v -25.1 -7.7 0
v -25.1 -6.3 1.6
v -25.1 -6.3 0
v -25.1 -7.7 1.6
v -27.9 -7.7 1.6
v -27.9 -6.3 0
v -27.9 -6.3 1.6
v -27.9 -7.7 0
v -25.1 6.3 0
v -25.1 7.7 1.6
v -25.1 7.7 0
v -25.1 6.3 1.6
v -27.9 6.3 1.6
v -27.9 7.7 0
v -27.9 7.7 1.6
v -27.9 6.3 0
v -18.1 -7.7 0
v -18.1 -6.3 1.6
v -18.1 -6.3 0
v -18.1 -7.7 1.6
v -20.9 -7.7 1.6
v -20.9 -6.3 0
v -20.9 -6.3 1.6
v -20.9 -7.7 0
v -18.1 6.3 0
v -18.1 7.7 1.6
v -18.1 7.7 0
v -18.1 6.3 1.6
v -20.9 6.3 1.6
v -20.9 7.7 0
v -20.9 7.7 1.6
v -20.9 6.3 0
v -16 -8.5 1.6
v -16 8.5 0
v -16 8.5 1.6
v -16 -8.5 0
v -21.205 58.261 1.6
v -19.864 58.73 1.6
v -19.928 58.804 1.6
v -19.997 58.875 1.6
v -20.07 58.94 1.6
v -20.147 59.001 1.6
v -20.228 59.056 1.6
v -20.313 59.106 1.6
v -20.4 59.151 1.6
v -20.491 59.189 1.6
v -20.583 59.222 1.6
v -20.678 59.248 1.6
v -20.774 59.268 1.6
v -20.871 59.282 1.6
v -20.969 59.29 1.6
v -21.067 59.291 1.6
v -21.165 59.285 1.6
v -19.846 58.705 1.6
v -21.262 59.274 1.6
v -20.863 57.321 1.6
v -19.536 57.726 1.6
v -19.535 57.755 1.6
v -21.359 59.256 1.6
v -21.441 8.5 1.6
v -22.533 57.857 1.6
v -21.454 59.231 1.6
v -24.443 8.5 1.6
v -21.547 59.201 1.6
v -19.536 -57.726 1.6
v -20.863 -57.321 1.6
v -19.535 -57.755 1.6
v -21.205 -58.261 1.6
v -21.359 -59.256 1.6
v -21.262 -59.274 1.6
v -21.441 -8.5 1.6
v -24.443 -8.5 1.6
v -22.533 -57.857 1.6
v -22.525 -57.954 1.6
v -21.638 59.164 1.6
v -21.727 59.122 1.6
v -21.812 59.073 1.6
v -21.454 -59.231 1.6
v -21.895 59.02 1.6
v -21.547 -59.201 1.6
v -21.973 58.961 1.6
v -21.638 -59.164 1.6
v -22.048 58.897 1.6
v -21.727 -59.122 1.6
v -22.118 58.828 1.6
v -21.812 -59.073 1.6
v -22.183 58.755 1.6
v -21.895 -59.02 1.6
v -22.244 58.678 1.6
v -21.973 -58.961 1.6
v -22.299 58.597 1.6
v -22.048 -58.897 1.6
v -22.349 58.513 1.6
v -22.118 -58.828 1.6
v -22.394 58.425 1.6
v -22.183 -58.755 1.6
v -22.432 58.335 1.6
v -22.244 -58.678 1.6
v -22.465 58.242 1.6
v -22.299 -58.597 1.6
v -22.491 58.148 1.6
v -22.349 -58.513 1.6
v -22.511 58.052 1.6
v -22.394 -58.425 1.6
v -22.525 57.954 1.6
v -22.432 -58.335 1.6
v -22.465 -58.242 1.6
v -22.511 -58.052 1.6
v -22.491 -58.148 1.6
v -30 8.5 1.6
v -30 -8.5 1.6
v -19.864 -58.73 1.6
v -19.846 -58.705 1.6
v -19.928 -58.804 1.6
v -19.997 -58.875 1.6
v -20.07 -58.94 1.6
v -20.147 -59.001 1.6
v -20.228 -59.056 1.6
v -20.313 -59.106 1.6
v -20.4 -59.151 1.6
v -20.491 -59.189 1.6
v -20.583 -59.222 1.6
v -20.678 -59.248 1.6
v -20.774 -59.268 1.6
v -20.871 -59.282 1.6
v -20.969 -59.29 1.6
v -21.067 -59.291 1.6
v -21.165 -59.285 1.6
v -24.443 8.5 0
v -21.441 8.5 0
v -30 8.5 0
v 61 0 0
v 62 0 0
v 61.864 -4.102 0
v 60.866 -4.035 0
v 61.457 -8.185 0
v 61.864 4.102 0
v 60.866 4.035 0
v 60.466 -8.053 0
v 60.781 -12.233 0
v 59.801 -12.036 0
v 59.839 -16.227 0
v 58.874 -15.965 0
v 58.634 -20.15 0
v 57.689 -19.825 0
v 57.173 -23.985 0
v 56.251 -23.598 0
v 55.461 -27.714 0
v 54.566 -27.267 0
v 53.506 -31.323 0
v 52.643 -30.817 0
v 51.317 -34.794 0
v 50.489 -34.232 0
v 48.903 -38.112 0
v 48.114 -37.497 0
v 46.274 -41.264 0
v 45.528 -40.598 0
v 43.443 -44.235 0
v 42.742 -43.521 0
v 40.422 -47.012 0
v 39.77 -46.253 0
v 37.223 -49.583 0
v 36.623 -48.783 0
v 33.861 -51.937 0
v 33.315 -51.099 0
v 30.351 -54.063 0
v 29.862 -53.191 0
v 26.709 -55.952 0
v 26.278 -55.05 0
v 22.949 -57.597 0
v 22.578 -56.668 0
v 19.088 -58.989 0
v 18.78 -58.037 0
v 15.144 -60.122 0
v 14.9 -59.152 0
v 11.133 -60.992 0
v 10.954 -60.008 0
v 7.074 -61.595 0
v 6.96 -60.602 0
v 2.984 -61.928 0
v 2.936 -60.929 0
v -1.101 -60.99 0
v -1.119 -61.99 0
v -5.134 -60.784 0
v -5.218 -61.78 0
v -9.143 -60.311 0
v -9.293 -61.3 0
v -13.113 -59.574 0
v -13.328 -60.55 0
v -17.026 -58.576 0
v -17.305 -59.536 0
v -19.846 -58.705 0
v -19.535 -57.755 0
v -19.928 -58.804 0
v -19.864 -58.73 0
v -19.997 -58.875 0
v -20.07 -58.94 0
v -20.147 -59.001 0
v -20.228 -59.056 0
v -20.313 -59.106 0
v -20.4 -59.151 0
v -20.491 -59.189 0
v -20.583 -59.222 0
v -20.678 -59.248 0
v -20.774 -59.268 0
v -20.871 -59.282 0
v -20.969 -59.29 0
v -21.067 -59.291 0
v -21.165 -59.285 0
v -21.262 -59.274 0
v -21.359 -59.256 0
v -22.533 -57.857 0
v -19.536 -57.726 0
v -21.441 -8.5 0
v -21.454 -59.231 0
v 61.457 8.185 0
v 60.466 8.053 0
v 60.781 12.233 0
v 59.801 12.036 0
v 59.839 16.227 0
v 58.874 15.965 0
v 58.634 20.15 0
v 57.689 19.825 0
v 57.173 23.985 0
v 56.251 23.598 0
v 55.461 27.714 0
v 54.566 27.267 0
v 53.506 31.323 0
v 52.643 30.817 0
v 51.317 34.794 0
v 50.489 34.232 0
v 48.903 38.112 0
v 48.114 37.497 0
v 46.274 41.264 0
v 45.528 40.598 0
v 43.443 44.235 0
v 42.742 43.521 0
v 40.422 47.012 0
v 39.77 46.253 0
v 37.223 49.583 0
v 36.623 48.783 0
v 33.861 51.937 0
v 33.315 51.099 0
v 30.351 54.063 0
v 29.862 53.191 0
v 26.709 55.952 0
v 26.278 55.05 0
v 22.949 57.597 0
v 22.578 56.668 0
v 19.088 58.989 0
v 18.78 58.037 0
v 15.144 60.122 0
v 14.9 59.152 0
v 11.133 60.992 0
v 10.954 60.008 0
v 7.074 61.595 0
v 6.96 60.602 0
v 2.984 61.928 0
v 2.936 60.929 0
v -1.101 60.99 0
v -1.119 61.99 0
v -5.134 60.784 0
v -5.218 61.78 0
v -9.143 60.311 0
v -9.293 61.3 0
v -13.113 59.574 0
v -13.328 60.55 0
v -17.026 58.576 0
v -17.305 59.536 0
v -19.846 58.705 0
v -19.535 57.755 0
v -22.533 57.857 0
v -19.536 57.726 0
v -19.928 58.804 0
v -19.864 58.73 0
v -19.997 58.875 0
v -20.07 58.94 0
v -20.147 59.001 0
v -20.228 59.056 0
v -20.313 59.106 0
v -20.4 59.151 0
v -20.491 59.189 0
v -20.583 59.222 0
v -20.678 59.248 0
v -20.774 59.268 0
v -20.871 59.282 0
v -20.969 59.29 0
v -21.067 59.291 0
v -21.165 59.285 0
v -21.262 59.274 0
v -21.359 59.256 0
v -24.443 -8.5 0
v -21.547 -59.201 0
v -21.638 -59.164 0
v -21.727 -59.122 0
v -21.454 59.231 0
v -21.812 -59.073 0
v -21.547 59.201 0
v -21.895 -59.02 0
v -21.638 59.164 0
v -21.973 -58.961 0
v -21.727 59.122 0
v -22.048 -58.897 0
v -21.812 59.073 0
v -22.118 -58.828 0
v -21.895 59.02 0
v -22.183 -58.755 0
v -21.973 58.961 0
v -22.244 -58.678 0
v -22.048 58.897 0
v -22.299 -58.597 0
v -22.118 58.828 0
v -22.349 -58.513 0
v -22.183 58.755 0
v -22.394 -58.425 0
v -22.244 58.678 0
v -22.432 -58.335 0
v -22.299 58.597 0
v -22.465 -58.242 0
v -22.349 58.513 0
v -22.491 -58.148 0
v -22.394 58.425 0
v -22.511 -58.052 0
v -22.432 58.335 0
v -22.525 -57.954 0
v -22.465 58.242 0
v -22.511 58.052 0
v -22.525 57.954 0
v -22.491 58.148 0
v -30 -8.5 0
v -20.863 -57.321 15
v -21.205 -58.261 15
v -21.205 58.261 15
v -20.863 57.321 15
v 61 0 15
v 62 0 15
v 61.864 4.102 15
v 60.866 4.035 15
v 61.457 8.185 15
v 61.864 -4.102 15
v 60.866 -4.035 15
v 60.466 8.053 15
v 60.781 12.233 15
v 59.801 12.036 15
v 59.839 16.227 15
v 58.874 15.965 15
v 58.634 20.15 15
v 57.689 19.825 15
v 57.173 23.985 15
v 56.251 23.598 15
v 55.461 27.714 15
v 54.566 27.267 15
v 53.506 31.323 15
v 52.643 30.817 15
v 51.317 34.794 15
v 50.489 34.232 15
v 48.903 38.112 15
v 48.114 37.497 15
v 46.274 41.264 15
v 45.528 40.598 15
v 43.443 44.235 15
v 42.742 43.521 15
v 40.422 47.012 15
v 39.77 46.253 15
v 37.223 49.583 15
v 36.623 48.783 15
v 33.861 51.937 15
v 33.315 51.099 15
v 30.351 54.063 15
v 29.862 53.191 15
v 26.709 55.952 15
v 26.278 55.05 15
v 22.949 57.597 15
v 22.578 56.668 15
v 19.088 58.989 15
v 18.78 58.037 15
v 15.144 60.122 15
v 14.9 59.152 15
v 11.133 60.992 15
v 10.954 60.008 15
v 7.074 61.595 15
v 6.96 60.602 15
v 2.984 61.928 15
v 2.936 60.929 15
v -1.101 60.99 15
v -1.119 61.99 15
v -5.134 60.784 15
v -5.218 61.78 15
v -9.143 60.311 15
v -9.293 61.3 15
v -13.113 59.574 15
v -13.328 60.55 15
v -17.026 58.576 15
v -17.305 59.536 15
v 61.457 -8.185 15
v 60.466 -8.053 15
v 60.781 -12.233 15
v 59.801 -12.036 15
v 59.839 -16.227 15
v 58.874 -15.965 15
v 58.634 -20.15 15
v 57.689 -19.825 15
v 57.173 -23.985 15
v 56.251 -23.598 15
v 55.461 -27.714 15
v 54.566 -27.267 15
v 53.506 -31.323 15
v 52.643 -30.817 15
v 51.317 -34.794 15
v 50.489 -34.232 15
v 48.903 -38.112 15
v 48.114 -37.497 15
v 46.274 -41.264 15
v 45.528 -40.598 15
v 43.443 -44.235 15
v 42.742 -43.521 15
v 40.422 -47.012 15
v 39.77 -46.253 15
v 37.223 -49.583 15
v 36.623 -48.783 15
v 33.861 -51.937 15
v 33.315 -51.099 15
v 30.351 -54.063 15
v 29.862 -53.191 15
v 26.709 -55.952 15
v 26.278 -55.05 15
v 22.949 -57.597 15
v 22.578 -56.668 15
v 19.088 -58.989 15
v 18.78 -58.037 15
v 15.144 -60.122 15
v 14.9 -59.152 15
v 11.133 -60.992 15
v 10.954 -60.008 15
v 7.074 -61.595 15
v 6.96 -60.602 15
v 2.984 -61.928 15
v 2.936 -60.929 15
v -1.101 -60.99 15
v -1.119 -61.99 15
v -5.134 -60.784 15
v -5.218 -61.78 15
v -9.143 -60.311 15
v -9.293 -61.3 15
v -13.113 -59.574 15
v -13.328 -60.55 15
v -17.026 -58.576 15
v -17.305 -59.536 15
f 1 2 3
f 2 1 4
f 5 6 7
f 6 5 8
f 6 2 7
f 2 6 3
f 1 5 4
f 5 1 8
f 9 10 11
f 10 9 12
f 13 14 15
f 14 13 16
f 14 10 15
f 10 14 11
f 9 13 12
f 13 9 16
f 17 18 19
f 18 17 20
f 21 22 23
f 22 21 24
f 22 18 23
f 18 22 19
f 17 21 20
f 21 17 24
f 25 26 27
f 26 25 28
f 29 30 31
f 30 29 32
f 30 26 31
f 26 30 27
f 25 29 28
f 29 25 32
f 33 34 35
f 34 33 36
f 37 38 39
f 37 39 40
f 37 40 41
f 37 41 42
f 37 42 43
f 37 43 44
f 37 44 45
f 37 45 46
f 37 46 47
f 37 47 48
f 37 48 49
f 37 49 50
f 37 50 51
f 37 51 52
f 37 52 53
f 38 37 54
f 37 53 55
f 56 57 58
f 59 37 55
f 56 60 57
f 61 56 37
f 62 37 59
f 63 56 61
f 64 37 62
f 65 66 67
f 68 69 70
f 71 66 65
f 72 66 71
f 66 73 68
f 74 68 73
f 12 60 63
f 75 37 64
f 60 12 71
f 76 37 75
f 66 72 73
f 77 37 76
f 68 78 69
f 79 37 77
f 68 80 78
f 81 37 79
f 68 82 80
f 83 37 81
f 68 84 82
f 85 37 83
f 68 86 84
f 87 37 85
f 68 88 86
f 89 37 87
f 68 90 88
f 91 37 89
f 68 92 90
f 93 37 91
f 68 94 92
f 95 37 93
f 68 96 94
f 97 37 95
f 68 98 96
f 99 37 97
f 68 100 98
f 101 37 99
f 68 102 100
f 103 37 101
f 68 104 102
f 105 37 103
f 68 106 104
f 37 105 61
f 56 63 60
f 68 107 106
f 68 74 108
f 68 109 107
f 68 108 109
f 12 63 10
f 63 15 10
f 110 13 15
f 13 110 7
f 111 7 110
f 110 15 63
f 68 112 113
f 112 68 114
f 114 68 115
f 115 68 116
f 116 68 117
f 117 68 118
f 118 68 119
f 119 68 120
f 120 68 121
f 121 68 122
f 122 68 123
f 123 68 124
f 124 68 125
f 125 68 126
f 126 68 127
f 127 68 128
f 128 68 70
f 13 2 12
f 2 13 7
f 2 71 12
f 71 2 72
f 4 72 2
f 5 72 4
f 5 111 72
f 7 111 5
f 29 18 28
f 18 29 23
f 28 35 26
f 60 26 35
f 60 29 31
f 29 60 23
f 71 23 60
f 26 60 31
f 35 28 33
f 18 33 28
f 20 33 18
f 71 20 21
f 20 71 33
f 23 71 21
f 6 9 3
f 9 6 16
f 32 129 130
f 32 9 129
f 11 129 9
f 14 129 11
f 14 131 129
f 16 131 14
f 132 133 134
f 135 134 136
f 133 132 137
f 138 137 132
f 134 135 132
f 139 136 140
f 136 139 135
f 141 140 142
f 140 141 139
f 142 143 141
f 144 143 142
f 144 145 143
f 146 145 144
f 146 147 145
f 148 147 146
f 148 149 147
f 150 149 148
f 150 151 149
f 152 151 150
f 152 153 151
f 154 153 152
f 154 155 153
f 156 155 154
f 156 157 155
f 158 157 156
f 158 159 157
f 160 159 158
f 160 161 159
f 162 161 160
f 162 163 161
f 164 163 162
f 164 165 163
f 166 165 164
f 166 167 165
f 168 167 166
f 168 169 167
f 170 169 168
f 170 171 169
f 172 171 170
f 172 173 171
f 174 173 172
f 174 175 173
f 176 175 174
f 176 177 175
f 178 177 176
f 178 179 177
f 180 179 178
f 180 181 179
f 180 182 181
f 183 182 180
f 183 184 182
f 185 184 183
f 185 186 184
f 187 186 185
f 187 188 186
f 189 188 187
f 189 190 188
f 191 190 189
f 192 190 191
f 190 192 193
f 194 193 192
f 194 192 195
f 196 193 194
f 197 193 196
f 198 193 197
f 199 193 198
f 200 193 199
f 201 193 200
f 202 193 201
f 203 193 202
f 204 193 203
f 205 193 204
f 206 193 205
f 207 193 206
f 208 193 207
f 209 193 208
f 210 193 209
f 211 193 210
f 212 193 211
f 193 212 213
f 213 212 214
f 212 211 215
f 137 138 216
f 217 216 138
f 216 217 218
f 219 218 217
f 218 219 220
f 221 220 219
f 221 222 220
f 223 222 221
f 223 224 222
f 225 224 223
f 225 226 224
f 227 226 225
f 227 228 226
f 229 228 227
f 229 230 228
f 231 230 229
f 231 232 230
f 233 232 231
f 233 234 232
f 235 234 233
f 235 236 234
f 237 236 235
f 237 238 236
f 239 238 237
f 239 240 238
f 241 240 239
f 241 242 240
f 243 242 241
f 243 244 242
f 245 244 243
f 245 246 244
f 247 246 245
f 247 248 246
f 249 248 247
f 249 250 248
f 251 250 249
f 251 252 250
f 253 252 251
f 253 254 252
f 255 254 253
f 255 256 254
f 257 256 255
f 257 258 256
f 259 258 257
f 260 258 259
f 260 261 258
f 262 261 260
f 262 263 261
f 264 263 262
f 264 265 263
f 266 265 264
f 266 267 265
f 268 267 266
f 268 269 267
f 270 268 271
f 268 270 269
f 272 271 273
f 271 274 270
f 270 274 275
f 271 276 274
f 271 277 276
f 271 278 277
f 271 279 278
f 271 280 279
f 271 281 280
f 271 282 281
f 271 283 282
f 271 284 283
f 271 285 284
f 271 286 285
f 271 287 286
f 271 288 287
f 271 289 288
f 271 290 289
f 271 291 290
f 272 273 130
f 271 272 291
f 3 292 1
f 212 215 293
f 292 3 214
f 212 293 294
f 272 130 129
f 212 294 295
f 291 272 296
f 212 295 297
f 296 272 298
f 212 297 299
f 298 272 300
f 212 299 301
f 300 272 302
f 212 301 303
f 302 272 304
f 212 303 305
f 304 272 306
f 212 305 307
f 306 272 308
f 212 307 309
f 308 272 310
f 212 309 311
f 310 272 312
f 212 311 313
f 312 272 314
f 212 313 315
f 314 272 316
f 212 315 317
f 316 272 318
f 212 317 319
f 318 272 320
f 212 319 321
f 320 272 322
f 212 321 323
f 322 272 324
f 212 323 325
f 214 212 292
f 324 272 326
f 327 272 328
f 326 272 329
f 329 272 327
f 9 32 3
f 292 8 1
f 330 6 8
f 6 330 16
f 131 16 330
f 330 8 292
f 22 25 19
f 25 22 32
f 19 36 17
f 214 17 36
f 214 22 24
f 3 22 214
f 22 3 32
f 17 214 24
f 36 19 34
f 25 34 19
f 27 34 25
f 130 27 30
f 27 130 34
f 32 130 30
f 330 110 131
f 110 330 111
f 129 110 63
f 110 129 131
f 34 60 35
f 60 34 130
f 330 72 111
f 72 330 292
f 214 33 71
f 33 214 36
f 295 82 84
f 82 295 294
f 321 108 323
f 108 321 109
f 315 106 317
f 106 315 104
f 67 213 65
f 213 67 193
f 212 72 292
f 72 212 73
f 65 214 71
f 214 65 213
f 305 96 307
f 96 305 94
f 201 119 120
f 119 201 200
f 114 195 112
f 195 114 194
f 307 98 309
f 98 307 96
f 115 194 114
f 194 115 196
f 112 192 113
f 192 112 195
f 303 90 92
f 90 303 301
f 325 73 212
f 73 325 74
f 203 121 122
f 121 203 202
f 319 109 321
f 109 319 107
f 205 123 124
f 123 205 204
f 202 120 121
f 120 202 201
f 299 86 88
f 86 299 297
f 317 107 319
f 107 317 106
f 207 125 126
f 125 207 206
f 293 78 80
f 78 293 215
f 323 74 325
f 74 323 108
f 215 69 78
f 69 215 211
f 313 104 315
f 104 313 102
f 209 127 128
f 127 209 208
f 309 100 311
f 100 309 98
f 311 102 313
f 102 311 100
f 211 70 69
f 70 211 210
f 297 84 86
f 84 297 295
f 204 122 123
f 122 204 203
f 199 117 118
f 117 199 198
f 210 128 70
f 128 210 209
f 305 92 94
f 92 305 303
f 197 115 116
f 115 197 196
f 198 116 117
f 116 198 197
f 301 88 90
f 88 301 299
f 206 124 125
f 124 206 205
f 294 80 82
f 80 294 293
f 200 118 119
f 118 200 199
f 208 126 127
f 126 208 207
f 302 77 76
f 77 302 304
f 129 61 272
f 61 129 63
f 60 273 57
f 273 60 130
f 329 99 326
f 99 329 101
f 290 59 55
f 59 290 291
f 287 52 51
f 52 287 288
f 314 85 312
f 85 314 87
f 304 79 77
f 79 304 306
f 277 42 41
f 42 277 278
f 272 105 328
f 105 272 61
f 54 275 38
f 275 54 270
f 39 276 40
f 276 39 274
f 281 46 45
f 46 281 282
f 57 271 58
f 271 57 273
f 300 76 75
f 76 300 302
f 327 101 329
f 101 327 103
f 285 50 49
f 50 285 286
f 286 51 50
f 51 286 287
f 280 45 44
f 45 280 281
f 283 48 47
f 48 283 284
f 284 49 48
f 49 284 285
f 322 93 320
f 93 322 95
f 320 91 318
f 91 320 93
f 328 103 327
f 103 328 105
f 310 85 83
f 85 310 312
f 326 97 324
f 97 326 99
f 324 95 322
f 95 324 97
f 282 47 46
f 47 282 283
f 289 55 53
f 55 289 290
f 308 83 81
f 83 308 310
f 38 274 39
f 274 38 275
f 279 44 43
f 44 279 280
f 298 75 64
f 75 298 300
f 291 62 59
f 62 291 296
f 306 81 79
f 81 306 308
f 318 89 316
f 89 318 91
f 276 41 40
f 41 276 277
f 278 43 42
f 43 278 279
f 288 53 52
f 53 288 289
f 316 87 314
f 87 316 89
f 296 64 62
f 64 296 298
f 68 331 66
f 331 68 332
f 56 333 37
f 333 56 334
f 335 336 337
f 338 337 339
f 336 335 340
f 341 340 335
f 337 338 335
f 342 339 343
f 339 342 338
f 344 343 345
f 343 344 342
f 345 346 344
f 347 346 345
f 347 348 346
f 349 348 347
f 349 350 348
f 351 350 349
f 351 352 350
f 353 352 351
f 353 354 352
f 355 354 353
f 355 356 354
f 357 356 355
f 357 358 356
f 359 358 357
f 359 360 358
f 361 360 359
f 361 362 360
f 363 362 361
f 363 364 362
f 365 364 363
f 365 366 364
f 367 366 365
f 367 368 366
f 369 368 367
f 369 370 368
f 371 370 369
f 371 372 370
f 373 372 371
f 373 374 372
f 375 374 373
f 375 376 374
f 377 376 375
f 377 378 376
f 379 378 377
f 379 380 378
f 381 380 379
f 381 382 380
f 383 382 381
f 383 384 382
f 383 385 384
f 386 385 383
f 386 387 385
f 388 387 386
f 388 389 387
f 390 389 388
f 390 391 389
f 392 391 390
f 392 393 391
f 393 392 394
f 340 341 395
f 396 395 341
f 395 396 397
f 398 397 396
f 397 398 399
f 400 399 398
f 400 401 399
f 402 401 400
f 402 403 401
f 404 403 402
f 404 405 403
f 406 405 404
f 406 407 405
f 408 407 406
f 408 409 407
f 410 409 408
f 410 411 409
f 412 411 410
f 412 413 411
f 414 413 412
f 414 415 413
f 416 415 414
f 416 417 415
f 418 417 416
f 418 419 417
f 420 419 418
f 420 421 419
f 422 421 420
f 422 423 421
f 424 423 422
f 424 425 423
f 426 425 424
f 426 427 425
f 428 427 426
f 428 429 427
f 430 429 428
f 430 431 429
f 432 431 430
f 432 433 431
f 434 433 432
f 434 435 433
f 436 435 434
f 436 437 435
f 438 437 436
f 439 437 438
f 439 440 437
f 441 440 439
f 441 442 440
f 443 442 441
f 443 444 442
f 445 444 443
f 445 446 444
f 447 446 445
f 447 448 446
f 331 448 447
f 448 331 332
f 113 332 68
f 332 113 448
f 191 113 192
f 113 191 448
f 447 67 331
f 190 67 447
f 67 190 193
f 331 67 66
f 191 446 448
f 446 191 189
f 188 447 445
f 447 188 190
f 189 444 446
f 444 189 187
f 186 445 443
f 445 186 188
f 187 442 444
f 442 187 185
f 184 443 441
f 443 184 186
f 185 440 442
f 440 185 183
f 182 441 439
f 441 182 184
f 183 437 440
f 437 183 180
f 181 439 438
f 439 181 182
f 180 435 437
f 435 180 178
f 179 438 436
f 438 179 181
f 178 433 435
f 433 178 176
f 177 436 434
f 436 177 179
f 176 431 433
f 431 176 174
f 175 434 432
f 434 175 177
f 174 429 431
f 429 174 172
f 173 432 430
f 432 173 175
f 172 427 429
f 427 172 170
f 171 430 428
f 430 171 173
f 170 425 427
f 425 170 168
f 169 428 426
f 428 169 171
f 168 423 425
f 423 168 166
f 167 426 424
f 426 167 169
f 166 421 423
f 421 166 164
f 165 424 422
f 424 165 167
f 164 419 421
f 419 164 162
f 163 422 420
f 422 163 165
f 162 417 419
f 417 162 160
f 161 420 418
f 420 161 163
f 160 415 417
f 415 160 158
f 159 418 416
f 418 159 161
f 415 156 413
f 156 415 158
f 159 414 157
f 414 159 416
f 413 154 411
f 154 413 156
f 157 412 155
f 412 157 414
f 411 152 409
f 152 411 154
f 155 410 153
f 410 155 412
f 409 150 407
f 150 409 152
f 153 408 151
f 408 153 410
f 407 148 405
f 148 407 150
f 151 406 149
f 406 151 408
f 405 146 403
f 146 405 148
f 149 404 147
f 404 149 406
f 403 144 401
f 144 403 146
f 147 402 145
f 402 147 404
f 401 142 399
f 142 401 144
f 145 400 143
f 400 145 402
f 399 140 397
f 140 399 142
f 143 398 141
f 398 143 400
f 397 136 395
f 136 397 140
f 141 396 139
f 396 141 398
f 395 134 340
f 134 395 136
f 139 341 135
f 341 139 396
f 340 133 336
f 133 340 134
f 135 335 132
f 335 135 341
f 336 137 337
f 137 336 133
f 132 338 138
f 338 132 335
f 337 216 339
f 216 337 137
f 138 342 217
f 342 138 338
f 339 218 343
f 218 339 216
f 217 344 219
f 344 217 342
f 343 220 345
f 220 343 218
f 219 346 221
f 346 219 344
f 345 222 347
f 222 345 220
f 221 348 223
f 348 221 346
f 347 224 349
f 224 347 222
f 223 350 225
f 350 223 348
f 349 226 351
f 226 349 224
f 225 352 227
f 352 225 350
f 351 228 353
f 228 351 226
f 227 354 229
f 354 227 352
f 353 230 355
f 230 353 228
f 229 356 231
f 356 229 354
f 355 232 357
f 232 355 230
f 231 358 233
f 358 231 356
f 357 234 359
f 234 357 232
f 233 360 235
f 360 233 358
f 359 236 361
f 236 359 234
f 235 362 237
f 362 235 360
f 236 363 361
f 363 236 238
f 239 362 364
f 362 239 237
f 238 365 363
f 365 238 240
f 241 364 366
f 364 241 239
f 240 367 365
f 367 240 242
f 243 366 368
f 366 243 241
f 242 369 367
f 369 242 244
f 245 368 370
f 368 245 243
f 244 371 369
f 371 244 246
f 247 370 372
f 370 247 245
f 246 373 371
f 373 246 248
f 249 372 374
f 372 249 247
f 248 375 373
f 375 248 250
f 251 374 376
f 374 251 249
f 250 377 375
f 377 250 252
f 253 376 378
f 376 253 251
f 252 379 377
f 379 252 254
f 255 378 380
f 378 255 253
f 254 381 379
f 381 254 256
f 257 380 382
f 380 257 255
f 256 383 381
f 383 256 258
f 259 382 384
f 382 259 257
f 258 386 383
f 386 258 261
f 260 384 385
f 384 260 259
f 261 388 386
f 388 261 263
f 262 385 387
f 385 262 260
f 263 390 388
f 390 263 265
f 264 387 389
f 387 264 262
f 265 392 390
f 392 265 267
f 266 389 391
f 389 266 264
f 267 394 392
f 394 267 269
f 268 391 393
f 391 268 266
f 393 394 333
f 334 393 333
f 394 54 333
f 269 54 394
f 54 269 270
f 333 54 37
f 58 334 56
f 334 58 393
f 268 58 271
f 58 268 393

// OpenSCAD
// Contixo F19 Arvo prop guard: parametric DRAFT. One per motor; print 4 (all four are identical).
//
// Numbers marked EST were estimated from photos (about +/- 3-5 mm). Numbers marked MEASURE are
// guesses. Check both with calipers before printing.
//
// How it mounts: the flat saddle sits on top of the arm, right next to the motor, and two mini zip
// ties (2.5 mm wide) go through the slots and around the arm. The curved wall wraps the outer side
// of the prop, from arm height up past the prop plane.
//
// Open in OpenSCAD (free: brew install --cask openscad), press F6 to render, File > Export > STL.
// Print flat side down, PETG or PLA, 0.2 mm layers, no supports.
// Weight estimate in PLA at the defaults: about 5 g each, 20 g for all four. Weigh the drone first:
// the total must stay under 250 g.

/* [Drone, measure these] */
prop_d       = 110;  // EST: prop tip-to-tip diameter (photos showed 105-111 mm)
prop_z       = 12;   // MEASURE: height of the prop blades above the top of the arm
arm_w        = 11;   // EST: arm width next to the motor
motor_to_arm = 16;   // MEASURE: motor center to where the saddle sits on the arm

/* [Guard] */
clearance = 6;    // gap between prop tips and the wall
wall      = 1.0;  // wall thickness: thinner is lighter, 1.0-1.4 mm prints fine
wall_top  = 3;    // how far the wall reaches above the prop plane
arc_deg   = 220;  // how much of the circle is guarded (outer side; 360 = full ring)
base_t    = 1.6;  // spokes and saddle thickness
spoke_w   = 3;    // spoke width
saddle_l  = 14;   // saddle length along the arm
tie_w     = 2.8;  // zip-tie slot width (for 2.5 mm ties)
tie_t     = 1.4;  // zip-tie slot thickness

$fn = 96;

r_in  = prop_d / 2 + clearance;
r_mid = r_in + wall / 2;
wall_h = prop_z + wall_top;
end_a = arc_deg / 2;  // the arc is centered on +X, pointing away from the body along the arm

// The curved wall.
module wall_arc() {
    rotate([0, 0, -end_a])
        rotate_extrude(angle = arc_deg)
            translate([r_in, 0]) square([wall, wall_h]);
}

// Saddle on the arm (the arm runs from the motor at the origin toward the body, along -X).
module saddle() {
    sx = motor_to_arm + saddle_l / 2;
    difference() {
        translate([-sx - saddle_l / 2, -arm_w / 2 - spoke_w, 0])
            cube([saddle_l, arm_w + 2 * spoke_w, base_t]);
        for (dx = [-saddle_l / 4, saddle_l / 4], side = [-1, 1])  // zip-tie slots on both sides of the arm
            translate([-sx + dx - tie_w / 2, side * (arm_w / 2 + spoke_w / 2) - tie_t / 2, -1])
                cube([tie_w, tie_t, base_t + 2]);
    }
}

// Spokes from the saddle's outer corners to the two ends of the wall, at arm height, under the prop.
module spokes() {
    sx = motor_to_arm + saddle_l / 2;
    for (side = [-1, 1])
        hull() {
            translate([-sx, side * (arm_w / 2 + spoke_w / 2), 0]) cylinder(d = spoke_w, h = base_t);
            rotate([0, 0, side * end_a]) translate([r_mid, 0, 0]) cylinder(d = spoke_w, h = base_t);
        }
}

wall_arc();
saddle();
spokes();
